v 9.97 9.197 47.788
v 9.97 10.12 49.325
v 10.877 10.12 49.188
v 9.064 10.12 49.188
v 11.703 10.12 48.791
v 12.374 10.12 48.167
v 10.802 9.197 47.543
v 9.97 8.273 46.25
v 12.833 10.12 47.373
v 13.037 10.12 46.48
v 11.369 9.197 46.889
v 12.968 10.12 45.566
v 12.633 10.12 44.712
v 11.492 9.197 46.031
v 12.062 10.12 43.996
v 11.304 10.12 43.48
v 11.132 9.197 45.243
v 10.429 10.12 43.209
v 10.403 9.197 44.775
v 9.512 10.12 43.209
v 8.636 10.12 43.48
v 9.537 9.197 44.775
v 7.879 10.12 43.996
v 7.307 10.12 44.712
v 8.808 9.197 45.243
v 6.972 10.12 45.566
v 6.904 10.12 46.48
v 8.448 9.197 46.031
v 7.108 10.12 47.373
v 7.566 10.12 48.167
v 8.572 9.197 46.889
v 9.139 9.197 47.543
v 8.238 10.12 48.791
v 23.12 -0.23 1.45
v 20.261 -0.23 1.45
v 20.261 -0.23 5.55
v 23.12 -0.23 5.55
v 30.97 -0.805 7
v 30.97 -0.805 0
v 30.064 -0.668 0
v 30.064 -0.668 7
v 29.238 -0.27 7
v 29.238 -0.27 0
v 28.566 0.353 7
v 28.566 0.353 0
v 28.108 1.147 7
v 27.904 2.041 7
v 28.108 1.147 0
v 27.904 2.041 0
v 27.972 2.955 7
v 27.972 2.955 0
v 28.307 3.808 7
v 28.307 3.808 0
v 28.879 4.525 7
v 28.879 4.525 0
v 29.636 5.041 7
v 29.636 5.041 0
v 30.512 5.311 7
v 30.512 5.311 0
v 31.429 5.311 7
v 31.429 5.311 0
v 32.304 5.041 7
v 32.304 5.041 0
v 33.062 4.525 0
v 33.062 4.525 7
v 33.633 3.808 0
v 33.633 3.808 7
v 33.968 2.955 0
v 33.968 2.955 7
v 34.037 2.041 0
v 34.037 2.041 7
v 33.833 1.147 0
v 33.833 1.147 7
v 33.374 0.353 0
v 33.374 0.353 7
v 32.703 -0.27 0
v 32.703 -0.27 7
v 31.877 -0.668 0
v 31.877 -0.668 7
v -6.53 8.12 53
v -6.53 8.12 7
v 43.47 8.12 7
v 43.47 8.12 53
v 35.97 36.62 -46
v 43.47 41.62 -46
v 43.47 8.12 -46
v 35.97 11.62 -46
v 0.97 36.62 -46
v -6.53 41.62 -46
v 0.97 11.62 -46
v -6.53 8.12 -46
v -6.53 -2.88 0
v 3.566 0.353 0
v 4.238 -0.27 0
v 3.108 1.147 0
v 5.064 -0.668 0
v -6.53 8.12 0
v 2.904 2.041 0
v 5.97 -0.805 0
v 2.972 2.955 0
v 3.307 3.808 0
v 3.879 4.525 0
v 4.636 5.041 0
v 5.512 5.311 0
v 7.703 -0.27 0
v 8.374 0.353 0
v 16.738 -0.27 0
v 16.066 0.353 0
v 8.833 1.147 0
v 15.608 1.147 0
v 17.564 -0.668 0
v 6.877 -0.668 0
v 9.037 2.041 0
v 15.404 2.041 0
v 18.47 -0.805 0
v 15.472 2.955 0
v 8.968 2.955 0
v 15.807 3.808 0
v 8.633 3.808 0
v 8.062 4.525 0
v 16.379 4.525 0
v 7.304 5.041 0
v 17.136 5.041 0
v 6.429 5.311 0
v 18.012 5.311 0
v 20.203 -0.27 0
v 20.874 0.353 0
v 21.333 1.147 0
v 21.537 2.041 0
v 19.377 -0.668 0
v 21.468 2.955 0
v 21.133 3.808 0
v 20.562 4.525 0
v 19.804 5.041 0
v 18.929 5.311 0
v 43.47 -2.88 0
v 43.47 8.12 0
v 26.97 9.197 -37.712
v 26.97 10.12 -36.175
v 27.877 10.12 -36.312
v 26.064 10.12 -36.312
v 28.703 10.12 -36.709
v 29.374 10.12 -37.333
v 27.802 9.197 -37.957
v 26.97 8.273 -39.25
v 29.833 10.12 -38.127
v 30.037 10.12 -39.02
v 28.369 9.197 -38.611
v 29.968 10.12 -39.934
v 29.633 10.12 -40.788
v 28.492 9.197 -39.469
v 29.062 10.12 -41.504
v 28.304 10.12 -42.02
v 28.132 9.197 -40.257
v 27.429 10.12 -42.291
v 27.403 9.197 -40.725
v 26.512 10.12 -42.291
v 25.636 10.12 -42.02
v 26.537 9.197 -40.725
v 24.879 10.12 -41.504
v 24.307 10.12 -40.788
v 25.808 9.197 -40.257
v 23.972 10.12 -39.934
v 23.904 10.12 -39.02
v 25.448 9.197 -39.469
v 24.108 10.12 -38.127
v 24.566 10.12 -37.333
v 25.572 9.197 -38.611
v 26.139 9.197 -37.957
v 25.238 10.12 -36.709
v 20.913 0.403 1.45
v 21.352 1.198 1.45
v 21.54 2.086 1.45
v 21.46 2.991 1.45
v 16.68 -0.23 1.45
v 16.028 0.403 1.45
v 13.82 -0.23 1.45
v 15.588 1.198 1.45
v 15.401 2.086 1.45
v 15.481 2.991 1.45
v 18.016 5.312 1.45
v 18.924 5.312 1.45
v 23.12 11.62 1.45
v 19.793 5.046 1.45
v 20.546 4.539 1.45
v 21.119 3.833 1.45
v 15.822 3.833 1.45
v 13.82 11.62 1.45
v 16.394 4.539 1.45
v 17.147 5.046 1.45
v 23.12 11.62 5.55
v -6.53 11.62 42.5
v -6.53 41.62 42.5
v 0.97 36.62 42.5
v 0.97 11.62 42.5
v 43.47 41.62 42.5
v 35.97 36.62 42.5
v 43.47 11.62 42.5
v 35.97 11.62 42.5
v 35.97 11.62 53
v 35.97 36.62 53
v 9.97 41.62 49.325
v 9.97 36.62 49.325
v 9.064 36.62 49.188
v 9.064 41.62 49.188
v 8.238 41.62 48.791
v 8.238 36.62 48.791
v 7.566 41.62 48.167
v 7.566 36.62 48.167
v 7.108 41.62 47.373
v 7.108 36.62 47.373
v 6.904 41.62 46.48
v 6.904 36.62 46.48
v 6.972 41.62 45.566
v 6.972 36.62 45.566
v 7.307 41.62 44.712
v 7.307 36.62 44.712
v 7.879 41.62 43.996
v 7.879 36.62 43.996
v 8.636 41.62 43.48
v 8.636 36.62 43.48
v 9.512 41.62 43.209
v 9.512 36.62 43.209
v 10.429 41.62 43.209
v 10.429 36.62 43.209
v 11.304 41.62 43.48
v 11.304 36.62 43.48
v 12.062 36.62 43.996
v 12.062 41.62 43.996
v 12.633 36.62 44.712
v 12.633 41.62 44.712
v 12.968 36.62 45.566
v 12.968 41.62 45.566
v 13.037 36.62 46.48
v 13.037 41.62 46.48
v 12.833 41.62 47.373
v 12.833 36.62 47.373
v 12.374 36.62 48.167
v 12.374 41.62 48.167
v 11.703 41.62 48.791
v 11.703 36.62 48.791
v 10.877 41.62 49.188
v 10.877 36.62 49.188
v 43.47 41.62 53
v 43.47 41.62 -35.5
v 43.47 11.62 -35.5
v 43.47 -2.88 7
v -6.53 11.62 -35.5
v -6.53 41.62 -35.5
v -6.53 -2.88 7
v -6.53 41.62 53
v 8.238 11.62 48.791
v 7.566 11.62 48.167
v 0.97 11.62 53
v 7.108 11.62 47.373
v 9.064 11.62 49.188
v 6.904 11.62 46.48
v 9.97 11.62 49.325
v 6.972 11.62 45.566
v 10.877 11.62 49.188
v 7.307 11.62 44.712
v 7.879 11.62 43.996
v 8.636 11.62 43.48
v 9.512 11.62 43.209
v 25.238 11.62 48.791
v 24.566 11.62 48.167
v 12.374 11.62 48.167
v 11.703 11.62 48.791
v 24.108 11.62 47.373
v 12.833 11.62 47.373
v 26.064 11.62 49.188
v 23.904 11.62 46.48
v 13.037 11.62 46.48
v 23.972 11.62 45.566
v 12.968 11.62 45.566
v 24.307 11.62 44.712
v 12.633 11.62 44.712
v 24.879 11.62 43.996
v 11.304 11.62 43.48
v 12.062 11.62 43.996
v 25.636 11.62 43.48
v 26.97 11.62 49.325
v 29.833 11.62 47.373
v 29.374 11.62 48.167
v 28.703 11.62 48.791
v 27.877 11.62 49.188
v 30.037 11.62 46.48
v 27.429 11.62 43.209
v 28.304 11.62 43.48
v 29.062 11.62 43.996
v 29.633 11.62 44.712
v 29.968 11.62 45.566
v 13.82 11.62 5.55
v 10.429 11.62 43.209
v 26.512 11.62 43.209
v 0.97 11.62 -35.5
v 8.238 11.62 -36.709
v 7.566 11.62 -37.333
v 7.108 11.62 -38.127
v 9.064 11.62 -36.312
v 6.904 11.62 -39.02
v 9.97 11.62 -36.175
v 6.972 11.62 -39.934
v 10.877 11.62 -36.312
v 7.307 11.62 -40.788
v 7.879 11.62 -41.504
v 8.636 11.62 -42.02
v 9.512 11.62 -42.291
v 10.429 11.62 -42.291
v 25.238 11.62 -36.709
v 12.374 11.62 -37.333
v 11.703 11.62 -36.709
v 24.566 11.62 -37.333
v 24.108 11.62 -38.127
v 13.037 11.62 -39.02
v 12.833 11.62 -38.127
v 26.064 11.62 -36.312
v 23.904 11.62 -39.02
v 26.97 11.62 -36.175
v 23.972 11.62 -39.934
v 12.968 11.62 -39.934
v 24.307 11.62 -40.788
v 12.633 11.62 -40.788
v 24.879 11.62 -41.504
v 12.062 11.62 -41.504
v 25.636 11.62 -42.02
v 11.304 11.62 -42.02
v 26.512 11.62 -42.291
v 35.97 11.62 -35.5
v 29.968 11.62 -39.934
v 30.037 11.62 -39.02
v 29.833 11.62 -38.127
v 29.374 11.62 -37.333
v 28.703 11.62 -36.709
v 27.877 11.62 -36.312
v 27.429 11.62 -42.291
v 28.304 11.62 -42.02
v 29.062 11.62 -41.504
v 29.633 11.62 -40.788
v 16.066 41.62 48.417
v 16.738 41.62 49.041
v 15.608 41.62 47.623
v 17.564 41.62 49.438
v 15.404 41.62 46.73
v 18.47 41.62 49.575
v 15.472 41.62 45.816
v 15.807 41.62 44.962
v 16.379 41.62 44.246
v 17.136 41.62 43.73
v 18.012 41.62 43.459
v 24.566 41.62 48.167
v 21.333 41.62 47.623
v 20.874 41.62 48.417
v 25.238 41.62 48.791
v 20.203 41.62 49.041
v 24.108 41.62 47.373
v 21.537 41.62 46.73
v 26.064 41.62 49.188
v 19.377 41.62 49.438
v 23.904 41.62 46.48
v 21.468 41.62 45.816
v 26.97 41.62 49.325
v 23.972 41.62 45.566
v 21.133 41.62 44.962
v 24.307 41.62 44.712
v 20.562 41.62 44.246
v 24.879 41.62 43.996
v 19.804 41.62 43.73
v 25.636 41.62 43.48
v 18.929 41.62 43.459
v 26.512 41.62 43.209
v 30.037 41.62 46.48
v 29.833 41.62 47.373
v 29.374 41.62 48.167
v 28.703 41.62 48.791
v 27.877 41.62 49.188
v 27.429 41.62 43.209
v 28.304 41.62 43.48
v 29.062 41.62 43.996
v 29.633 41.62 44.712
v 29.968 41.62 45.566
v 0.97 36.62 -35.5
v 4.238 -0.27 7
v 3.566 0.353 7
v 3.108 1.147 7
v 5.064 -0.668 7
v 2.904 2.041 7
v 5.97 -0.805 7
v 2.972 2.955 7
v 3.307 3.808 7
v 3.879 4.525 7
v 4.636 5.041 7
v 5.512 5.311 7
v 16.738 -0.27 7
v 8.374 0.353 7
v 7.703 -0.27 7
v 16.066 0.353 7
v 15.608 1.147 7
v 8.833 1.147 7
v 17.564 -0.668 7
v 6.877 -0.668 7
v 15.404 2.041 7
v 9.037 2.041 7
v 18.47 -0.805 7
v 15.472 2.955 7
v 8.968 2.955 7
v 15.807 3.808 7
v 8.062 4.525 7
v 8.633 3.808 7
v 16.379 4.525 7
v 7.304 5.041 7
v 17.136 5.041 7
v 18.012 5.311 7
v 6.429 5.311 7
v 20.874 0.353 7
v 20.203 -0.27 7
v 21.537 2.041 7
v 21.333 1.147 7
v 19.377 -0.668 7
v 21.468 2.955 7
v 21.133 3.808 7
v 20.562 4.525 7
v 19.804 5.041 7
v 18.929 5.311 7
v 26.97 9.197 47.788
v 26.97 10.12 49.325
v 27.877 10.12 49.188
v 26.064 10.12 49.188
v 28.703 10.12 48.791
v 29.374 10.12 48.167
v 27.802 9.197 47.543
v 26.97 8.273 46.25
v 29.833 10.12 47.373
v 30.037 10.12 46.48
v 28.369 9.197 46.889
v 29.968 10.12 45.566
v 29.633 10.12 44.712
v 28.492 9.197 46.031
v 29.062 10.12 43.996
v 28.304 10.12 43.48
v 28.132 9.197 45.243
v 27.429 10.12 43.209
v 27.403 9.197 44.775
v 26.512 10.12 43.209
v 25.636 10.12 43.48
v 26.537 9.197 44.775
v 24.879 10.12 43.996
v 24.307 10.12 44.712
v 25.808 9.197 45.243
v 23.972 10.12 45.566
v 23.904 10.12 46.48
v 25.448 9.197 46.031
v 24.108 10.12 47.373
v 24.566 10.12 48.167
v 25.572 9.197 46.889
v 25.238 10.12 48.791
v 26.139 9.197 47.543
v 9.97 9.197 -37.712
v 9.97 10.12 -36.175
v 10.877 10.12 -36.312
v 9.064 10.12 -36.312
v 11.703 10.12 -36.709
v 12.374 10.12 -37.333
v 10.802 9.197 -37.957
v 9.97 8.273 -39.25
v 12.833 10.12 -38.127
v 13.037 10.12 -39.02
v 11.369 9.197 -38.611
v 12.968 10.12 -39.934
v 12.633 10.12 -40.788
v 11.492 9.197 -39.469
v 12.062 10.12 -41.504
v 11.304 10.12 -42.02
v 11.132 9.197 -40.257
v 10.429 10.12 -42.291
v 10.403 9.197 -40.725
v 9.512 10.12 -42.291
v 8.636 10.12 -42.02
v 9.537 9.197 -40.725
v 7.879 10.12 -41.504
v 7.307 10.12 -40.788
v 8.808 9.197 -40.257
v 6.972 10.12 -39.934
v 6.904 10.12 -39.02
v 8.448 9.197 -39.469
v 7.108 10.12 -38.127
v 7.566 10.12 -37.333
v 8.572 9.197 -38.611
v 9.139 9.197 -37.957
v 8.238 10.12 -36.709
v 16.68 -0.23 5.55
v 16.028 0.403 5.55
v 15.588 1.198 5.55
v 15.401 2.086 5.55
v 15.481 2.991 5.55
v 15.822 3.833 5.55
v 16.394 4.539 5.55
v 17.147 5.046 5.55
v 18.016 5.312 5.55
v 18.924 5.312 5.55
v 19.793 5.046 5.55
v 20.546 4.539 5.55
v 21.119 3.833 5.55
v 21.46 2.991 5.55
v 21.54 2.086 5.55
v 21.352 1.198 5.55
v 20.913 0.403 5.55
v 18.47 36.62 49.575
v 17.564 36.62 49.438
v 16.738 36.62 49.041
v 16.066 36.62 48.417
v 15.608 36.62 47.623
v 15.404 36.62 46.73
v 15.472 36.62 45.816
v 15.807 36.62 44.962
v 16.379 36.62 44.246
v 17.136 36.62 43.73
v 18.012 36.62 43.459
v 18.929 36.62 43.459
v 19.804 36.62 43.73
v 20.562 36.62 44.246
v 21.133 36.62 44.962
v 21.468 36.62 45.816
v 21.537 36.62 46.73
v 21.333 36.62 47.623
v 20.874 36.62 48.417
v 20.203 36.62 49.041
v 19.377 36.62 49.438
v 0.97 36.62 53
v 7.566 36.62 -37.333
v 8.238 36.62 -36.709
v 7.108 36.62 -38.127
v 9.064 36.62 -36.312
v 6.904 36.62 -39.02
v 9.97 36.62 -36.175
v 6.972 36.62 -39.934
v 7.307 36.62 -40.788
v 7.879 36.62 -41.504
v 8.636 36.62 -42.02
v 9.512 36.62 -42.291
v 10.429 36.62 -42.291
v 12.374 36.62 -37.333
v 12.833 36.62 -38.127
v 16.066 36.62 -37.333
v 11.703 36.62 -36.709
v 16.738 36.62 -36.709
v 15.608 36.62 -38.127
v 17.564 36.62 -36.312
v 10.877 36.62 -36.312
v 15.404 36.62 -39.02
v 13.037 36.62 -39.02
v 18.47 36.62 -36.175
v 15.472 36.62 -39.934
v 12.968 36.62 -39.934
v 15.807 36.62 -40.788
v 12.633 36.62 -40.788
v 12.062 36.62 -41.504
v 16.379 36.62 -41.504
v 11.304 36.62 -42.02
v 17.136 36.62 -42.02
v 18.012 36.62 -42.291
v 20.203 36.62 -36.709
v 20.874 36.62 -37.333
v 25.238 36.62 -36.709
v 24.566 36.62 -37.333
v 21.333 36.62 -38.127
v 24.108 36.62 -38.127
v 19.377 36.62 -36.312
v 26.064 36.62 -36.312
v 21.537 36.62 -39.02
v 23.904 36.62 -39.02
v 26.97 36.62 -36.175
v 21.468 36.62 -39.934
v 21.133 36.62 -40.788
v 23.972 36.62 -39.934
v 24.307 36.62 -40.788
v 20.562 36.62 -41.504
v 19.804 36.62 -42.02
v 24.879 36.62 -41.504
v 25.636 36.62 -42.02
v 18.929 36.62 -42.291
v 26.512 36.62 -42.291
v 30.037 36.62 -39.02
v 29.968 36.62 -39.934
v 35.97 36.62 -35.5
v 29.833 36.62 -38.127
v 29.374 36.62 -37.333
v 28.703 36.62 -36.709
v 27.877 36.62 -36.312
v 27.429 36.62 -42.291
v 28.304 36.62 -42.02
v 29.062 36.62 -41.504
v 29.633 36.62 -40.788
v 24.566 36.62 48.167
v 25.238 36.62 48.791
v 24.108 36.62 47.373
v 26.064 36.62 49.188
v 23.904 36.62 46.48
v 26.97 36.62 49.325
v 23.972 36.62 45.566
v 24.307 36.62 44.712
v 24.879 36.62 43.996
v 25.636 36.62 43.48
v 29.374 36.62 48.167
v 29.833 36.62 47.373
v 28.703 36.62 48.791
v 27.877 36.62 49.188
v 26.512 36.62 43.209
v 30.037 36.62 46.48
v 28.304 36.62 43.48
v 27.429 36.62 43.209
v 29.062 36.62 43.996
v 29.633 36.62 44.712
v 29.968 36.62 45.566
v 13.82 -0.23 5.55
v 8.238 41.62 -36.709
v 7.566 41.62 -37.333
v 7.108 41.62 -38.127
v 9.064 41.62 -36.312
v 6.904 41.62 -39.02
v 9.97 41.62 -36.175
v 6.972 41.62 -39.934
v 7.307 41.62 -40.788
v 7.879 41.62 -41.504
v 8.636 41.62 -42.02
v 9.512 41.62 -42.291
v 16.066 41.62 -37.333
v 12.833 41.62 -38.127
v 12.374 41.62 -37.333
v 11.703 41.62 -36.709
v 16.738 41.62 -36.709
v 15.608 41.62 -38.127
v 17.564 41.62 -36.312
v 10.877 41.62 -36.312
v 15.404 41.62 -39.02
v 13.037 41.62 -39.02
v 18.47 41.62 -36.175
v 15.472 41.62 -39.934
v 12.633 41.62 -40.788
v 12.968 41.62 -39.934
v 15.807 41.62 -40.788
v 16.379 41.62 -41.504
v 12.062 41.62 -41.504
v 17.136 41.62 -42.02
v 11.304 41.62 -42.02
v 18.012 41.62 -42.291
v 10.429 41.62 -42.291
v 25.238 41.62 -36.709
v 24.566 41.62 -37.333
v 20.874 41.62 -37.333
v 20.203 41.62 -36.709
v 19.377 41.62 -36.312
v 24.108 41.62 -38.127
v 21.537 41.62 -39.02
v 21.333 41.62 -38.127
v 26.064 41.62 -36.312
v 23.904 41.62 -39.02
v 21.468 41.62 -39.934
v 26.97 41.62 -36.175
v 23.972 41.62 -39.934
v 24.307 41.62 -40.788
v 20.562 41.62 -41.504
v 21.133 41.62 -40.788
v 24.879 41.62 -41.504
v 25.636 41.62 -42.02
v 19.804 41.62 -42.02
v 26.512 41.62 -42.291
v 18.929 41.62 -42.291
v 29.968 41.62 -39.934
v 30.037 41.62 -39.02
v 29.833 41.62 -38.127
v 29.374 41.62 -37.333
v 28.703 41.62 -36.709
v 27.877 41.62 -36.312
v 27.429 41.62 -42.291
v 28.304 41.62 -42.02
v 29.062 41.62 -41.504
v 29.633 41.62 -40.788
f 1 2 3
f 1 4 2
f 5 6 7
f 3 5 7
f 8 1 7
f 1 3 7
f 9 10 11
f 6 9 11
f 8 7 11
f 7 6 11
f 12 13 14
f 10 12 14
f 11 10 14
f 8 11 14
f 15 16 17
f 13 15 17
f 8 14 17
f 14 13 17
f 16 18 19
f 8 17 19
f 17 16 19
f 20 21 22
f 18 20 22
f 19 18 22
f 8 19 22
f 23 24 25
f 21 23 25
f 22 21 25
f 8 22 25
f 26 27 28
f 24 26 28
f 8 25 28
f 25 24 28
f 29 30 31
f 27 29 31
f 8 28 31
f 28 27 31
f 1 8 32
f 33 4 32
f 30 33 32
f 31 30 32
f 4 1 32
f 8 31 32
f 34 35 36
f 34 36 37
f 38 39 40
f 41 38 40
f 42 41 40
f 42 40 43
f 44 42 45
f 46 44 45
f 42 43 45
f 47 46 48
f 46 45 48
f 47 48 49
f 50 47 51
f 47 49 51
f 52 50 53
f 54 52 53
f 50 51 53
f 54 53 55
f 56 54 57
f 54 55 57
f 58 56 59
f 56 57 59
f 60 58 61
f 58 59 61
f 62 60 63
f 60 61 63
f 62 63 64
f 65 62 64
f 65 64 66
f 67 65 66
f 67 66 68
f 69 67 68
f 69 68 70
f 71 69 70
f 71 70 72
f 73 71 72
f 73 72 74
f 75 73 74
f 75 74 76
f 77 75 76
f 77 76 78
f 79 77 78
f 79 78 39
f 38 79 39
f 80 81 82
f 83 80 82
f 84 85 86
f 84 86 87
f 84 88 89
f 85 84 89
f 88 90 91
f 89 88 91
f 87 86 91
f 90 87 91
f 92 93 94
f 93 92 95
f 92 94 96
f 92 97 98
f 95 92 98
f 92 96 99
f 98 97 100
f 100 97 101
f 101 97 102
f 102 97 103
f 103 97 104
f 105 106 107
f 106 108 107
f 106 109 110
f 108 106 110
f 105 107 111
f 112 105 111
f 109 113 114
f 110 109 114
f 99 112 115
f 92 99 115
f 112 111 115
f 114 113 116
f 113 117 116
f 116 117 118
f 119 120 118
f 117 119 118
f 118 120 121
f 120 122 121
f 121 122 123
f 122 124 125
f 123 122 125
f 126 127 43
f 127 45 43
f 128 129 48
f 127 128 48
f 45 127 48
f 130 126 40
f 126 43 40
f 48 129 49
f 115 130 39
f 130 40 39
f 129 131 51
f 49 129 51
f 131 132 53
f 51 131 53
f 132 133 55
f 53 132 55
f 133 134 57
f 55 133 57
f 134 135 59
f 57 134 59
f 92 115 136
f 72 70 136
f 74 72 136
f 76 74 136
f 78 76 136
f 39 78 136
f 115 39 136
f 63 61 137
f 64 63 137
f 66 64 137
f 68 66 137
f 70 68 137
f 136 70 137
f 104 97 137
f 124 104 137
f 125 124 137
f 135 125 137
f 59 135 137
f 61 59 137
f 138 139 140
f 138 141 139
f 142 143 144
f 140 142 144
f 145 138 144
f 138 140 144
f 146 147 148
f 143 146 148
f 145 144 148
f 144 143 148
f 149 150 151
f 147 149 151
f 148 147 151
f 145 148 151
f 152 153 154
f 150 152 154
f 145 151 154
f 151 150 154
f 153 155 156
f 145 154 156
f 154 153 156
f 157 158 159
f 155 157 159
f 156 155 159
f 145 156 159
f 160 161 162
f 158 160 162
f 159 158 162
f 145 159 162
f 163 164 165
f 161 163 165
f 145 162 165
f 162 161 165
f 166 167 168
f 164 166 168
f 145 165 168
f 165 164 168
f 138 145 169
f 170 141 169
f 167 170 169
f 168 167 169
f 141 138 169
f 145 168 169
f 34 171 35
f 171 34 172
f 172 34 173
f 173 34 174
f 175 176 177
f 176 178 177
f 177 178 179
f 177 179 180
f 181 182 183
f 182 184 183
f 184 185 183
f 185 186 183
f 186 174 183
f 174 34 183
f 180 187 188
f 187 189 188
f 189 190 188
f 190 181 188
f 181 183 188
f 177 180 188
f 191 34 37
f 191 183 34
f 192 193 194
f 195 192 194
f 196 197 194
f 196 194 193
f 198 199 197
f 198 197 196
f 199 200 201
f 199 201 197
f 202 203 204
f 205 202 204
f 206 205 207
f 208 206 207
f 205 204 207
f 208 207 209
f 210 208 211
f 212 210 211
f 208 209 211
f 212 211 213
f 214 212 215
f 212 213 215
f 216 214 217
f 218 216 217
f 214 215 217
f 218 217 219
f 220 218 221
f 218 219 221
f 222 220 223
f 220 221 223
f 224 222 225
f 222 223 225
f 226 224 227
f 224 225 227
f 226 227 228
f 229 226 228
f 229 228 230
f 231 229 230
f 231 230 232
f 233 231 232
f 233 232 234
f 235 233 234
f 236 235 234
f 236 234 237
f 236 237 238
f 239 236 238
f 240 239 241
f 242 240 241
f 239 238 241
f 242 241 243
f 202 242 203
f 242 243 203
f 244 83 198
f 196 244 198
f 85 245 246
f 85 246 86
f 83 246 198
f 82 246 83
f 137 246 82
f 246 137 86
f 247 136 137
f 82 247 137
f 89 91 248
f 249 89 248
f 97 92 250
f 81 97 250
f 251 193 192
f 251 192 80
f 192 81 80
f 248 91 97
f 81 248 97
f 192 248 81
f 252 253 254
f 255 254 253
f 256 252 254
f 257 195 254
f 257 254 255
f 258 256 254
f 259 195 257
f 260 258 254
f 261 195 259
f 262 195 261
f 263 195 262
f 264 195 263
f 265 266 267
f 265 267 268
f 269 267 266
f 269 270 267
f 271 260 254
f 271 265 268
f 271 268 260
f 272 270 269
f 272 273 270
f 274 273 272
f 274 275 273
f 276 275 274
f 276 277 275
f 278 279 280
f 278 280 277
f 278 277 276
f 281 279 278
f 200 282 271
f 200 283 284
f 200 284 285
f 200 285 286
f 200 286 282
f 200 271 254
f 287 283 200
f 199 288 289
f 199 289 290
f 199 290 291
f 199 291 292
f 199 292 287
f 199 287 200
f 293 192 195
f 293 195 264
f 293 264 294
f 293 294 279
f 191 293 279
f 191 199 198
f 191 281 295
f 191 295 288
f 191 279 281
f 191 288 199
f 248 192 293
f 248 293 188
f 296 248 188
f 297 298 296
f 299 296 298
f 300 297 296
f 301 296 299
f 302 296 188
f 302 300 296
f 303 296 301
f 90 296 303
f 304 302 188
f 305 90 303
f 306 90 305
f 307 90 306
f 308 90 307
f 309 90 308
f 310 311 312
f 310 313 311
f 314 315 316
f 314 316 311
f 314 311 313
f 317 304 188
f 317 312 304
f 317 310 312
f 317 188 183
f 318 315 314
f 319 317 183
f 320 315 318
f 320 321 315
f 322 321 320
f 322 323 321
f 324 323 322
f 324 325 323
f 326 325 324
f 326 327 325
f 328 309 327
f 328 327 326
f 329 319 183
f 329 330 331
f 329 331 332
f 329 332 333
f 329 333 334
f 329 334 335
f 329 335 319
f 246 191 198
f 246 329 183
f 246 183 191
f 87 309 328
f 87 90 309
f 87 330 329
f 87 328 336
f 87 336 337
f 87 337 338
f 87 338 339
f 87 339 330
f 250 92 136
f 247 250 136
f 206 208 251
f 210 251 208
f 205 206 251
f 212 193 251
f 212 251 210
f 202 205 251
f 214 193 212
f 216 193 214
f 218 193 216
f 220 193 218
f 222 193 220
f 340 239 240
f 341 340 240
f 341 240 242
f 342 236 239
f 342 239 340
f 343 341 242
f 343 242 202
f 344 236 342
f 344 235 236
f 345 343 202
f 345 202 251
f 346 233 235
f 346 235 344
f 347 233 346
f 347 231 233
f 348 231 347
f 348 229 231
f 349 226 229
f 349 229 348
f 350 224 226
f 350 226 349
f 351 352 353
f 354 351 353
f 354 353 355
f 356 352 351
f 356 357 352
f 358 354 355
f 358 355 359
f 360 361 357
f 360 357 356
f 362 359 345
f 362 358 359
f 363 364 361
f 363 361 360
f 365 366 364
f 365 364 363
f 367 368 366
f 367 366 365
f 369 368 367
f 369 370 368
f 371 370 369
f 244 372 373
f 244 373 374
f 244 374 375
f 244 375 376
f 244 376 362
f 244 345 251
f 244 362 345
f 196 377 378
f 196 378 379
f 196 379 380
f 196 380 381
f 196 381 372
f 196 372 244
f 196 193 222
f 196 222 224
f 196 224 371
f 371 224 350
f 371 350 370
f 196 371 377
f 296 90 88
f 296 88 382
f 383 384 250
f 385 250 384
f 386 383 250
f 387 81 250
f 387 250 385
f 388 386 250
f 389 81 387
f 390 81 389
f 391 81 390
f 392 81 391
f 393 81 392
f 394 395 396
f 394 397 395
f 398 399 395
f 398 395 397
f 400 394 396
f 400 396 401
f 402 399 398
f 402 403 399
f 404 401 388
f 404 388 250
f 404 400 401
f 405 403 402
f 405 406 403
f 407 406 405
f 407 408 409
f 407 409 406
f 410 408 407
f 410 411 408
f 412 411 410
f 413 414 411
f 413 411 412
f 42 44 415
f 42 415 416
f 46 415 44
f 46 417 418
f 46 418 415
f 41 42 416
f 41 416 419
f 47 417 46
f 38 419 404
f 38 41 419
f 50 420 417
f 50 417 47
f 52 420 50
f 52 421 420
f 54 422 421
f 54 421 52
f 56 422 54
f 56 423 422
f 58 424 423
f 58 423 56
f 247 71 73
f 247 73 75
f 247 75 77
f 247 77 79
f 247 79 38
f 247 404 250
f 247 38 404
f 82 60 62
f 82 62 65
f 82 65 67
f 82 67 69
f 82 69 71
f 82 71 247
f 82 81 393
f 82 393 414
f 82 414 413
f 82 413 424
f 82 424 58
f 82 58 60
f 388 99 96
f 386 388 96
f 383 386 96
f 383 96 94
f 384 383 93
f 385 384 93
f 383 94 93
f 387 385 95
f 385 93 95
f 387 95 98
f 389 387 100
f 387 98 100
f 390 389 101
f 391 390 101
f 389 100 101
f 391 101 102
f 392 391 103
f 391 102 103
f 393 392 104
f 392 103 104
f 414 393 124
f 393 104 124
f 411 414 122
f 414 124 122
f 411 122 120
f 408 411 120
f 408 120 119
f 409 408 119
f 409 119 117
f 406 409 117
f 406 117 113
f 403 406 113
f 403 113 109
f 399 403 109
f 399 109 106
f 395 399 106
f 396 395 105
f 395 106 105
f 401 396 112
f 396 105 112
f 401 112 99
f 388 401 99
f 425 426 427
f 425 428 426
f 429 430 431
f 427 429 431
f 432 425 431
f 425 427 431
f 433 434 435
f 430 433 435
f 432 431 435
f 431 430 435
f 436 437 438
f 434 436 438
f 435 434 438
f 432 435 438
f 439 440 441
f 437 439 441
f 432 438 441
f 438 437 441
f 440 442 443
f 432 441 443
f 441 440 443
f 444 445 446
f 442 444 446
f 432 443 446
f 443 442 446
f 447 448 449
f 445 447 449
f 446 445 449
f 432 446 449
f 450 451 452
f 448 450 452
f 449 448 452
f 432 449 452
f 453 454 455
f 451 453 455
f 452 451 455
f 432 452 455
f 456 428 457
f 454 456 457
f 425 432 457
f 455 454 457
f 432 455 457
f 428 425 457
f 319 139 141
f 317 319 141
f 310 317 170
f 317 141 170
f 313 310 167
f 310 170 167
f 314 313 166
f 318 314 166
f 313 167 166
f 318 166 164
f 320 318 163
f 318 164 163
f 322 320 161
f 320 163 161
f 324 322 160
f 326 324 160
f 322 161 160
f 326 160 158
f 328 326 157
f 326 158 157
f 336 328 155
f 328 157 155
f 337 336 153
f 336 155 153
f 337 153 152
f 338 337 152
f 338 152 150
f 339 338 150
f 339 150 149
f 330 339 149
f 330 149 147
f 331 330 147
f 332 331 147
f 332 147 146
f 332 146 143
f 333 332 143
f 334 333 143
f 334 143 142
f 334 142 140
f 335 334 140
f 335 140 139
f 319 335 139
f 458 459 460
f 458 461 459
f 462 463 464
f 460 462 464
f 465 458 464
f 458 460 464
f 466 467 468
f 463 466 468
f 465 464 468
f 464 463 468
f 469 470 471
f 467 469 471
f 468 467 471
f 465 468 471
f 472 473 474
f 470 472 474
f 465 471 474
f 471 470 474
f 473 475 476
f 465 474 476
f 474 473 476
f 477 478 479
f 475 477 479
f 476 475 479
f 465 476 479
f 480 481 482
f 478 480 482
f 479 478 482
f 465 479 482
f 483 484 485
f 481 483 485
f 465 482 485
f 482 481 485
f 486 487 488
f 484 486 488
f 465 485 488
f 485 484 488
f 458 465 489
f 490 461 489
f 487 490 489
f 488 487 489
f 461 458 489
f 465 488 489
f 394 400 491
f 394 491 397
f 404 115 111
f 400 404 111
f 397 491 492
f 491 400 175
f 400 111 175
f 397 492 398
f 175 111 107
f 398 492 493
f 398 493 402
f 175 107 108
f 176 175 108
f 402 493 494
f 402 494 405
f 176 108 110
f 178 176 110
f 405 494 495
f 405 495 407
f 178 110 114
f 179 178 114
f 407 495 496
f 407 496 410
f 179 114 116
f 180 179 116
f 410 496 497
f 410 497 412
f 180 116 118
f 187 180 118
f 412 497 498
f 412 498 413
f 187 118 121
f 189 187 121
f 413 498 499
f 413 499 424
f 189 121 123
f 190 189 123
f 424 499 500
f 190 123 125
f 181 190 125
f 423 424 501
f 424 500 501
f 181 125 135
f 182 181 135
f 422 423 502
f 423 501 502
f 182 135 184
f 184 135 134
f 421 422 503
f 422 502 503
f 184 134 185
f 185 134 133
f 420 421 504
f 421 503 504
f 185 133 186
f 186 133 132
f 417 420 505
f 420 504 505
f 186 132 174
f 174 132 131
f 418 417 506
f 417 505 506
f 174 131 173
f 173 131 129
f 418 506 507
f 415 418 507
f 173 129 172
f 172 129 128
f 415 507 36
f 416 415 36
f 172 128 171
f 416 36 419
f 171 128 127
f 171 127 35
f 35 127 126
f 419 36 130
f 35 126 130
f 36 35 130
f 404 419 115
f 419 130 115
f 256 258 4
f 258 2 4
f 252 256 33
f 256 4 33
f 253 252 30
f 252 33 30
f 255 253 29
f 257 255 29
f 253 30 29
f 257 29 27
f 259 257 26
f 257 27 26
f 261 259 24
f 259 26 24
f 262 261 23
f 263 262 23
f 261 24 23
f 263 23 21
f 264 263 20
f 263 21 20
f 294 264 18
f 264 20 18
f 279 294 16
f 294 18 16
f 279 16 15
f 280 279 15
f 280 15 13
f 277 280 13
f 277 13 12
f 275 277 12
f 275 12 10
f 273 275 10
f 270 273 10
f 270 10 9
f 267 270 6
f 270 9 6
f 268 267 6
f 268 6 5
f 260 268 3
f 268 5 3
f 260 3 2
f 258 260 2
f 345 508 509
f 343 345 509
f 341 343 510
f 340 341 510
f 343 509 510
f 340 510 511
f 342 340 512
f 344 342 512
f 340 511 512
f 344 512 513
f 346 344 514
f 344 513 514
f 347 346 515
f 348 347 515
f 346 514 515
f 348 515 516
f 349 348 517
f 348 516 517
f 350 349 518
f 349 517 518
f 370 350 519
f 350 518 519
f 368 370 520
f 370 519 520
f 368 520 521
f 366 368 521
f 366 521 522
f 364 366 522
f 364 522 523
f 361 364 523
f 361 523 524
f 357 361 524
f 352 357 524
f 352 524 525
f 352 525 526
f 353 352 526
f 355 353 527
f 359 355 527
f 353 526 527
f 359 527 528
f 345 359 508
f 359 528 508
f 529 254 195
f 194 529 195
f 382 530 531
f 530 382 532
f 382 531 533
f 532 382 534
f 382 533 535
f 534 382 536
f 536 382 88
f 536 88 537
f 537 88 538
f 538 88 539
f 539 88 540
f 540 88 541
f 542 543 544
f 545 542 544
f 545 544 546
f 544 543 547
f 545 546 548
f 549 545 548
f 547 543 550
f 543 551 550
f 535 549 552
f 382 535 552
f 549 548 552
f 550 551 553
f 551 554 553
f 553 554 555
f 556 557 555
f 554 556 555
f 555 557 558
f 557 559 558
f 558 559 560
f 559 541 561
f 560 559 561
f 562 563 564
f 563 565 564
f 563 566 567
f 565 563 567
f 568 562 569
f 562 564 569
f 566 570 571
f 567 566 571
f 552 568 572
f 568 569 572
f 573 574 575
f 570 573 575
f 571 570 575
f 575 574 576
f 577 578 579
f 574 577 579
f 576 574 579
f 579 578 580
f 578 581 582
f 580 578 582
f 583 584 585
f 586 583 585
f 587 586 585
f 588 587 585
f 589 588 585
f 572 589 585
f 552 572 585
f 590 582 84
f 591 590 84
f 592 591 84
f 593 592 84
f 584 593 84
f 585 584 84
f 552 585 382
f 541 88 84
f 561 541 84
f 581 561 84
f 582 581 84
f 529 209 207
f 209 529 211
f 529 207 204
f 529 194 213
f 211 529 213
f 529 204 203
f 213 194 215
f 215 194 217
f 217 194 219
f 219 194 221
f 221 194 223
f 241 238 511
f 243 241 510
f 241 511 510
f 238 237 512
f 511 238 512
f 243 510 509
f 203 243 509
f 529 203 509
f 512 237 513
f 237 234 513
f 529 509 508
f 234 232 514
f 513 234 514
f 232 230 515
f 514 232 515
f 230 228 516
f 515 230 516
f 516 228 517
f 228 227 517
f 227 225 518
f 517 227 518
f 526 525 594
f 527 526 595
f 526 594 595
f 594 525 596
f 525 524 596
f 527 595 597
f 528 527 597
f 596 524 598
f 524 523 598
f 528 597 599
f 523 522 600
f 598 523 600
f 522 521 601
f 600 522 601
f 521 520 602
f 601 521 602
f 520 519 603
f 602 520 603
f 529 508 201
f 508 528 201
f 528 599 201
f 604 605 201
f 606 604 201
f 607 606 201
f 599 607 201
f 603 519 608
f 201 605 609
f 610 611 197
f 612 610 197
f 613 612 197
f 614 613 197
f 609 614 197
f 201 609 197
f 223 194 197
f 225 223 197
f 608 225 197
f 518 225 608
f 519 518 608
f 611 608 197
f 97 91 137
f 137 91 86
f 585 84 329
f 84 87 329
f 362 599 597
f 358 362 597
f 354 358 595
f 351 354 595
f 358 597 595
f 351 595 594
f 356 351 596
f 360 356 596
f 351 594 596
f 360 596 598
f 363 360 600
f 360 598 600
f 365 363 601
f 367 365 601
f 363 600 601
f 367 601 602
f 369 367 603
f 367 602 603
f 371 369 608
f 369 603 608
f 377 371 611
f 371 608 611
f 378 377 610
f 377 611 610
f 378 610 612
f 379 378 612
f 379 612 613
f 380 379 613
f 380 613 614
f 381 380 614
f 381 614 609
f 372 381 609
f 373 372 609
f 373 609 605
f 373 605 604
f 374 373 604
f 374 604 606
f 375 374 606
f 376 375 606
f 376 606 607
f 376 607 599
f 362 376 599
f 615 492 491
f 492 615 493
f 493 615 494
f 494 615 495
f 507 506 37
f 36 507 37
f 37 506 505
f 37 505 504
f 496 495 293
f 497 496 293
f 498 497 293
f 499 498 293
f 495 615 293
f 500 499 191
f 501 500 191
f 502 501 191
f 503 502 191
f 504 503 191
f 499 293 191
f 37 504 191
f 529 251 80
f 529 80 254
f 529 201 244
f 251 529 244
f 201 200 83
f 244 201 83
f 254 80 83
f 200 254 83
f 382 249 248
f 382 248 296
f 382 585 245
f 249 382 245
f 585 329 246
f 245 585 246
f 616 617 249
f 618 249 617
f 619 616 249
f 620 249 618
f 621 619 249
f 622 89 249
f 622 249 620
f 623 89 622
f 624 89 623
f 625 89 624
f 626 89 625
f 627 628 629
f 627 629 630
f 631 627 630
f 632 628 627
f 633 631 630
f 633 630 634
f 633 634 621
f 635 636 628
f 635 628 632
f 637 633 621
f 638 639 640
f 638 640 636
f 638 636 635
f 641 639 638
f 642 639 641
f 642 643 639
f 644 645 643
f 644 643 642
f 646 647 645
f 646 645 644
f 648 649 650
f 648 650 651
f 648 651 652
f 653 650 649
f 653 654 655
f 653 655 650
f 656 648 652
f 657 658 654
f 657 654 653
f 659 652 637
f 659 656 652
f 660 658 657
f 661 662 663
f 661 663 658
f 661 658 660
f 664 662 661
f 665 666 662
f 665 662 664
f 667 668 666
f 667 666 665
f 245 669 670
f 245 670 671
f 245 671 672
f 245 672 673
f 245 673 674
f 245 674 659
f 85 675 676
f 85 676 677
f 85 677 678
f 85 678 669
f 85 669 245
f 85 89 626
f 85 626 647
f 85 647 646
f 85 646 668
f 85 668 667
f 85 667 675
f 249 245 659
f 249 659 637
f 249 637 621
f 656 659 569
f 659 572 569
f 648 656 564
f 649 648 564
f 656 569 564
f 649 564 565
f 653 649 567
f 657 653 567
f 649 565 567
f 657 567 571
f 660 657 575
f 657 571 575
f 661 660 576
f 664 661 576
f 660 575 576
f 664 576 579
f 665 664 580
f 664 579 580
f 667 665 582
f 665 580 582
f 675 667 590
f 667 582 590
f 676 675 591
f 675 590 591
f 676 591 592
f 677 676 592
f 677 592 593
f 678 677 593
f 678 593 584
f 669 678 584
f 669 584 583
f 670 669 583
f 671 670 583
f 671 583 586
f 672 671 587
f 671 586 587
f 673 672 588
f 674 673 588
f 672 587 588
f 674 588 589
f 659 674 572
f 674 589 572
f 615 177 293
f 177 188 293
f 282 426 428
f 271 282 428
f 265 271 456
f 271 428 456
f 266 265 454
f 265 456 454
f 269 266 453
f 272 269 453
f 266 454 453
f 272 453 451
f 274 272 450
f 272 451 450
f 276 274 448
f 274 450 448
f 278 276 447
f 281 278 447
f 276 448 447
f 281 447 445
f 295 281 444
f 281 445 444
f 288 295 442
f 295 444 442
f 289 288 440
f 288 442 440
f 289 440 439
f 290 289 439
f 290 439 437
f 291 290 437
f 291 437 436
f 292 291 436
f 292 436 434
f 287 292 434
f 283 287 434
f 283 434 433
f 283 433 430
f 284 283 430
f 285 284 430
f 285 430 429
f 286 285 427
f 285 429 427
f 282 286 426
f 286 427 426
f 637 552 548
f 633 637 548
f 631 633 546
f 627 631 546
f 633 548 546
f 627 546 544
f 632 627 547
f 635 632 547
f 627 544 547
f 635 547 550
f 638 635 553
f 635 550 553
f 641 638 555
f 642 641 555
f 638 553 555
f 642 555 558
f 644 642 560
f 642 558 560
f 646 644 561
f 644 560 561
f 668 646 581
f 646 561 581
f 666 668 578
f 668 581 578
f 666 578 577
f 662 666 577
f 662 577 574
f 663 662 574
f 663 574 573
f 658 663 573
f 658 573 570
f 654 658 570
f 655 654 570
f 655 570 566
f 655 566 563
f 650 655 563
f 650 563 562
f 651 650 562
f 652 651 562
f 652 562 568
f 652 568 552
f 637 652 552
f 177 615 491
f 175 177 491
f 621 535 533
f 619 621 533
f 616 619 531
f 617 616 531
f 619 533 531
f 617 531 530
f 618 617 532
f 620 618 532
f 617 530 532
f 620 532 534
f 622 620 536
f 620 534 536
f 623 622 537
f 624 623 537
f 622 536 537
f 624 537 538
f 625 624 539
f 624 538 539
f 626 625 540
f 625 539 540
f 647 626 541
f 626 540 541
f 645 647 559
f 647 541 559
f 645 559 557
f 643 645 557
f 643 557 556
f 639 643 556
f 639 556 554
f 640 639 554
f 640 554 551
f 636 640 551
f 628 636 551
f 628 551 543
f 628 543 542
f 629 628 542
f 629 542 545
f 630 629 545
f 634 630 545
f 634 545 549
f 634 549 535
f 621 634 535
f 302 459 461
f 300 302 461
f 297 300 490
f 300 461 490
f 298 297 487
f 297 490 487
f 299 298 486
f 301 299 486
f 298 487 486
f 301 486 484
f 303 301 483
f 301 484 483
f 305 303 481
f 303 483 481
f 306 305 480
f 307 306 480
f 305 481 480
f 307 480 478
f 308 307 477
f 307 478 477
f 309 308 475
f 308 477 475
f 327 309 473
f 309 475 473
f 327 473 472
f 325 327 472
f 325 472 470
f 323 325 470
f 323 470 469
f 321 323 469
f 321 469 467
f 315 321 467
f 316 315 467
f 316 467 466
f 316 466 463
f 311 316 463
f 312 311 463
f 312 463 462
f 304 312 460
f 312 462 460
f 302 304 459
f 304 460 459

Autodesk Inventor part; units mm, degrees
ref_plane "YZ Plane" through (0, 0, 0) normal (1, 0, 0) x (0, 1, 0)
ref_plane "XZ Plane" through (0, 0, 0) normal (0, 1, 0) x (-1, 0, 0)
ref_plane "XY Plane" through (0, 0, 0) normal (0, 0, 1) x (1, 0, 0)
sketch "Skizze1" plane through (0, 0, 0) normal (0, 0, 1) x (1, 0, 0)
  line L0 (-6.5297, -2.8796) -> (43.4703, -2.8796)
  line L1 (43.4703, -2.8796) -> (43.4703, 8.1204)
  line L2 (43.4703, 8.1204) -> (-6.5297, 8.1204)
  line L3 (-6.5297, 8.1204) -> (-6.5297, -2.8796)
  point P0 (0, 0)
  dimension "d0" = 50
  dimension "d1" = 11
extrude "Extrusion1" add sketch "Skizze1" along normal blind 7
sketch "Skizze2" plane through (-6.5297, 8.1204, 0) normal (0, 1, 0) x (1, 0, 0)
  line L0 (29.65, -5.55) -> (20.35, -5.55)
  line L1 (20.35, -5.55) -> (20.35, -1.45)
  line L2 (20.35, -1.45) -> (29.65, -1.45)
  line L3 (29.65, -1.45) -> (29.65, -5.55)
  line L4 (50, -7) -> (0, -7) projected
  line L5 (50, 0) -> (50, -7) projected
  line L6 (0, 0) -> (0, -7) projected
  point P0 (6.5297, 0)
  dimension "d4" = 9.3
  dimension "d5" = 4.1
  dimension "d6" = 1.45
  dimension "d7" = 20.35
  dimension "d8" = 20.35
extrude "Extrusion2" cut sketch "Skizze2" against normal blind 8.35
sketch "Skizze3" plane through (0, 0, 7) normal (0, 0, 1) x (1, 0, 0)
  line L0 (-6.5297, 8.1204) -> (-6.5297, -2.8796) projected
  line L1 (43.4703, 8.1204) -> (-6.5297, 8.1204) projected
  point P0 (0, 0)
  point P1 (5.9703, 2.2704)
  point P2 (18.4703, 2.2704)
  point P3 (30.9703, 2.2704)
  dimension "d11" = 12.5
  dimension "d12" = 12.5
  dimension "d13" = 12.5
  dimension "d14" = 5.85
hole "Bohrung1" at (5.9703, 2.2704, 7) at (18.4703, 2.2704, 7) at (30.9703, 2.2704, 7) direction (0, 0, -1) diameter 6.15 end through all
sketch "Skizze4" plane through (-6.5297, 8.1204, 0) normal (0, 1, 0) x (1, 0, 0)
  point P0 (6.5297, 0)
sketch "Skizze5" plane through (-6.5297, 8.1204, 0) normal (0, 1, 0) x (1, 0, 0)
  line L0 (50, 0) -> (0, 0) projected
  line L1 (0, 0) -> (0, -53.0037)
  line L2 (0, -53) -> (50, -53)
  line L3 (50, -53) -> (50, 46)
  line L4 (50, 46) -> (0, 46)
  line L5 (0, 46) -> (0, -53)
  point P0 (6.5297, 0)
  dimension "d22" = 50
  dimension "d23" = 99
  dimension "d24" = 46
extrude "Extrusion3" add sketch "Skizze5" along normal blind 3.5
sketch "Skizze6" plane through (-6.5297, 11.6204, 0) normal (0, 1, 0) x (1, 0, 0)
  line L0 (29.65, -1.45) -> (29.65, -5.55) projected
  line L1 (29.65, -1.45) -> (20.35, -1.45)
  line L2 (20.35, -1.45) -> (20.35, -5.55)
  line L3 (20.35, -5.55) -> (29.65, -5.55)
  line L4 (29.65, -5.55) -> (29.65, -1.45)
  point P0 (6.5297, 0)
extrude "Extrusion4" cut sketch "Skizze6" against normal blind 3.5
sketch "Skizze7" plane through (-6.5297, 11.6204, 0) normal (0, 1, 0) x (1, 0, 0)
  line L0 (0, -53) -> (50, -53) projected
  line L1 (50, -53) -> (42.5, -53)
  line L2 (42.5, -53) -> (42.5, -42.5)
  line L3 (42.5, -42.5) -> (50, -42.5)
  line L4 (50, -42.5) -> (50, -53)
  line L5 (0, -53) -> (7.5, -53)
  line L6 (7.5, -53) -> (7.5, -42.5)
  line L7 (7.5, -42.5) -> (0, -42.5)
  line L8 (0, -42.5) -> (0, -53)
  line L9 (0, 46) -> (0, -53) projected
  line L10 (0, 46) -> (7.5, 46)
  line L11 (7.5, 46) -> (7.5, 35.5)
  line L12 (7.5, 35.5) -> (0, 35.5)
  line L13 (0, 35.5) -> (0, 46)
  line L14 (50, -53) -> (50, 46) projected
  line L15 (50, 46) -> (42.5, 46)
  line L16 (42.5, 46) -> (42.5, 35.5)
  line L17 (42.5, 35.5) -> (50, 35.5)
  line L18 (50, 35.5) -> (50, 46)
  point P0 (6.5297, 0)
  dimension "d29" = 7.5
  dimension "d30" = 10.5
  dimension "d31" = 7.5
  dimension "d32" = 10.5
  dimension "d33" = 7.5
  dimension "d34" = 10.5
  dimension "d35" = 7.5
  dimension "d36" = 10.5
extrude "Extrusion5" add sketch "Skizze7" along normal blind 25
sketch "Skizze8" plane through (0.9703, 11.6204, -35.5) normal (1, 0, 0) x (0, 0, -1)
  point P0 (-35.5, -11.6204)
sketch "Skizze9" plane through (-6.5297, 36.6204, 0) normal (0, 1, 0) x (1, 0, 0)
  line L0 (50, -42.5) -> (50, 35.5) projected
  line L1 (0, 46) -> (50, 46)
  line L2 (50, 46) -> (50, 35.5)
  line L3 (50, 35.5) -> (0, 35.5)
  line L4 (0, 35.5) -> (0, 46)
  line L5 (50, -53) -> (50, -7) projected
  line L6 (0, -42.5) -> (50, -42.5)
  line L7 (50, -42.5) -> (50, -53)
  line L8 (50, -53) -> (0, -53)
  line L9 (0, -53) -> (0, -42.5)
  line L10 (50, -42.5) -> (42.5, -42.5) projected
  point P0 (6.5297, 0)
  dimension "d75" = 0
extrude "Extrusion6" add sketch "Skizze9" along normal blind 5
sketch "Skizze10" plane through (-6.5297, 41.6204, 0) normal (0, 1, 0) x (1, 0, 0)
  line L0 (50, 46) -> (0, 46) projected
  line L1 (0, -53) -> (50, -53) projected
  line L2 (42.5, -42.5) -> (42.5, -53) projected
  line L3 (42.5, 46) -> (42.5, 35.5) projected
  line L4 (7.5, 35.5) -> (7.5, 46) projected
  line L5 (7.5, -53) -> (7.5, -42.5) projected
  point P0 (6.5297, 0)
  point P1 (15.7518, 40.75)
  point P2 (25, 39.25)
  point P3 (33.5, 40.75)
  point P4 (15.6745, -47.75)
  point P5 (25, -46.5)
  point P6 (33.5, -47.75)
  dimension "d41" = 5.25
  dimension "d42" = 6.75
  dimension "d43" = 5.25
  dimension "d44" = 5.25
  dimension "d45" = 6.5
  dimension "d46" = 5.25
  dimension "d47" = 9
  dimension "d50" = 9
  dimension "d76" = 17.5
  dimension "d77" = 17.5
hole "Bohrung2" at (18.4703, 41.6204, 46.5) at (18.4703, 41.6204, -39.25) direction (0, -1, 0) diameter 6.15 depth 10 tip angle 118
sketch "Skizze11" plane through (-6.5297, 41.6204, 0) normal (0, 1, 0) x (1, 0, 0)
  line L0 (7.5, -53) -> (7.5, -42.5) projected
  line L1 (42.5, -42.5) -> (42.5, -53) projected
  line L2 (50, -42.5) -> (0, -42.5) projected
  line L3 (50, 46) -> (0, 46) projected
  line L4 (42.5, 46) -> (42.5, 35.5) projected
  line L5 (7.5, 35.5) -> (7.5, 46) projected
  point P0 (6.5297, 0)
  point P1 (16.5, -46.25)
  point P2 (33.5, -46.25)
  point P3 (16.5, 39.25)
  point P4 (33.5, 39.25)
  dimension "d60" = 9
  dimension "d61" = 9
  dimension "d62" = 3.75
  dimension "d63" = 3.75
  dimension "d64" = 6.75
  dimension "d65" = 6.75
  dimension "d66" = 9
  dimension "d67" = 9
hole "Bohrung3" at (9.9703, 41.6204, 46.25) at (26.9703, 41.6204, 46.25) at (9.9703, 41.6204, -39.25) at (26.9703, 41.6204, -39.25) direction (0, -1, 0) diameter 6.15 depth 31.5 tip angle 118
sketch "Skizze12" plane through (-6.5297, -2.8796, 0) normal (0, -1, 0) x (1, 0, 0)
  point P0 (6.5297, 0)
properties part number "Objektträgerhalter 1 fertig"
